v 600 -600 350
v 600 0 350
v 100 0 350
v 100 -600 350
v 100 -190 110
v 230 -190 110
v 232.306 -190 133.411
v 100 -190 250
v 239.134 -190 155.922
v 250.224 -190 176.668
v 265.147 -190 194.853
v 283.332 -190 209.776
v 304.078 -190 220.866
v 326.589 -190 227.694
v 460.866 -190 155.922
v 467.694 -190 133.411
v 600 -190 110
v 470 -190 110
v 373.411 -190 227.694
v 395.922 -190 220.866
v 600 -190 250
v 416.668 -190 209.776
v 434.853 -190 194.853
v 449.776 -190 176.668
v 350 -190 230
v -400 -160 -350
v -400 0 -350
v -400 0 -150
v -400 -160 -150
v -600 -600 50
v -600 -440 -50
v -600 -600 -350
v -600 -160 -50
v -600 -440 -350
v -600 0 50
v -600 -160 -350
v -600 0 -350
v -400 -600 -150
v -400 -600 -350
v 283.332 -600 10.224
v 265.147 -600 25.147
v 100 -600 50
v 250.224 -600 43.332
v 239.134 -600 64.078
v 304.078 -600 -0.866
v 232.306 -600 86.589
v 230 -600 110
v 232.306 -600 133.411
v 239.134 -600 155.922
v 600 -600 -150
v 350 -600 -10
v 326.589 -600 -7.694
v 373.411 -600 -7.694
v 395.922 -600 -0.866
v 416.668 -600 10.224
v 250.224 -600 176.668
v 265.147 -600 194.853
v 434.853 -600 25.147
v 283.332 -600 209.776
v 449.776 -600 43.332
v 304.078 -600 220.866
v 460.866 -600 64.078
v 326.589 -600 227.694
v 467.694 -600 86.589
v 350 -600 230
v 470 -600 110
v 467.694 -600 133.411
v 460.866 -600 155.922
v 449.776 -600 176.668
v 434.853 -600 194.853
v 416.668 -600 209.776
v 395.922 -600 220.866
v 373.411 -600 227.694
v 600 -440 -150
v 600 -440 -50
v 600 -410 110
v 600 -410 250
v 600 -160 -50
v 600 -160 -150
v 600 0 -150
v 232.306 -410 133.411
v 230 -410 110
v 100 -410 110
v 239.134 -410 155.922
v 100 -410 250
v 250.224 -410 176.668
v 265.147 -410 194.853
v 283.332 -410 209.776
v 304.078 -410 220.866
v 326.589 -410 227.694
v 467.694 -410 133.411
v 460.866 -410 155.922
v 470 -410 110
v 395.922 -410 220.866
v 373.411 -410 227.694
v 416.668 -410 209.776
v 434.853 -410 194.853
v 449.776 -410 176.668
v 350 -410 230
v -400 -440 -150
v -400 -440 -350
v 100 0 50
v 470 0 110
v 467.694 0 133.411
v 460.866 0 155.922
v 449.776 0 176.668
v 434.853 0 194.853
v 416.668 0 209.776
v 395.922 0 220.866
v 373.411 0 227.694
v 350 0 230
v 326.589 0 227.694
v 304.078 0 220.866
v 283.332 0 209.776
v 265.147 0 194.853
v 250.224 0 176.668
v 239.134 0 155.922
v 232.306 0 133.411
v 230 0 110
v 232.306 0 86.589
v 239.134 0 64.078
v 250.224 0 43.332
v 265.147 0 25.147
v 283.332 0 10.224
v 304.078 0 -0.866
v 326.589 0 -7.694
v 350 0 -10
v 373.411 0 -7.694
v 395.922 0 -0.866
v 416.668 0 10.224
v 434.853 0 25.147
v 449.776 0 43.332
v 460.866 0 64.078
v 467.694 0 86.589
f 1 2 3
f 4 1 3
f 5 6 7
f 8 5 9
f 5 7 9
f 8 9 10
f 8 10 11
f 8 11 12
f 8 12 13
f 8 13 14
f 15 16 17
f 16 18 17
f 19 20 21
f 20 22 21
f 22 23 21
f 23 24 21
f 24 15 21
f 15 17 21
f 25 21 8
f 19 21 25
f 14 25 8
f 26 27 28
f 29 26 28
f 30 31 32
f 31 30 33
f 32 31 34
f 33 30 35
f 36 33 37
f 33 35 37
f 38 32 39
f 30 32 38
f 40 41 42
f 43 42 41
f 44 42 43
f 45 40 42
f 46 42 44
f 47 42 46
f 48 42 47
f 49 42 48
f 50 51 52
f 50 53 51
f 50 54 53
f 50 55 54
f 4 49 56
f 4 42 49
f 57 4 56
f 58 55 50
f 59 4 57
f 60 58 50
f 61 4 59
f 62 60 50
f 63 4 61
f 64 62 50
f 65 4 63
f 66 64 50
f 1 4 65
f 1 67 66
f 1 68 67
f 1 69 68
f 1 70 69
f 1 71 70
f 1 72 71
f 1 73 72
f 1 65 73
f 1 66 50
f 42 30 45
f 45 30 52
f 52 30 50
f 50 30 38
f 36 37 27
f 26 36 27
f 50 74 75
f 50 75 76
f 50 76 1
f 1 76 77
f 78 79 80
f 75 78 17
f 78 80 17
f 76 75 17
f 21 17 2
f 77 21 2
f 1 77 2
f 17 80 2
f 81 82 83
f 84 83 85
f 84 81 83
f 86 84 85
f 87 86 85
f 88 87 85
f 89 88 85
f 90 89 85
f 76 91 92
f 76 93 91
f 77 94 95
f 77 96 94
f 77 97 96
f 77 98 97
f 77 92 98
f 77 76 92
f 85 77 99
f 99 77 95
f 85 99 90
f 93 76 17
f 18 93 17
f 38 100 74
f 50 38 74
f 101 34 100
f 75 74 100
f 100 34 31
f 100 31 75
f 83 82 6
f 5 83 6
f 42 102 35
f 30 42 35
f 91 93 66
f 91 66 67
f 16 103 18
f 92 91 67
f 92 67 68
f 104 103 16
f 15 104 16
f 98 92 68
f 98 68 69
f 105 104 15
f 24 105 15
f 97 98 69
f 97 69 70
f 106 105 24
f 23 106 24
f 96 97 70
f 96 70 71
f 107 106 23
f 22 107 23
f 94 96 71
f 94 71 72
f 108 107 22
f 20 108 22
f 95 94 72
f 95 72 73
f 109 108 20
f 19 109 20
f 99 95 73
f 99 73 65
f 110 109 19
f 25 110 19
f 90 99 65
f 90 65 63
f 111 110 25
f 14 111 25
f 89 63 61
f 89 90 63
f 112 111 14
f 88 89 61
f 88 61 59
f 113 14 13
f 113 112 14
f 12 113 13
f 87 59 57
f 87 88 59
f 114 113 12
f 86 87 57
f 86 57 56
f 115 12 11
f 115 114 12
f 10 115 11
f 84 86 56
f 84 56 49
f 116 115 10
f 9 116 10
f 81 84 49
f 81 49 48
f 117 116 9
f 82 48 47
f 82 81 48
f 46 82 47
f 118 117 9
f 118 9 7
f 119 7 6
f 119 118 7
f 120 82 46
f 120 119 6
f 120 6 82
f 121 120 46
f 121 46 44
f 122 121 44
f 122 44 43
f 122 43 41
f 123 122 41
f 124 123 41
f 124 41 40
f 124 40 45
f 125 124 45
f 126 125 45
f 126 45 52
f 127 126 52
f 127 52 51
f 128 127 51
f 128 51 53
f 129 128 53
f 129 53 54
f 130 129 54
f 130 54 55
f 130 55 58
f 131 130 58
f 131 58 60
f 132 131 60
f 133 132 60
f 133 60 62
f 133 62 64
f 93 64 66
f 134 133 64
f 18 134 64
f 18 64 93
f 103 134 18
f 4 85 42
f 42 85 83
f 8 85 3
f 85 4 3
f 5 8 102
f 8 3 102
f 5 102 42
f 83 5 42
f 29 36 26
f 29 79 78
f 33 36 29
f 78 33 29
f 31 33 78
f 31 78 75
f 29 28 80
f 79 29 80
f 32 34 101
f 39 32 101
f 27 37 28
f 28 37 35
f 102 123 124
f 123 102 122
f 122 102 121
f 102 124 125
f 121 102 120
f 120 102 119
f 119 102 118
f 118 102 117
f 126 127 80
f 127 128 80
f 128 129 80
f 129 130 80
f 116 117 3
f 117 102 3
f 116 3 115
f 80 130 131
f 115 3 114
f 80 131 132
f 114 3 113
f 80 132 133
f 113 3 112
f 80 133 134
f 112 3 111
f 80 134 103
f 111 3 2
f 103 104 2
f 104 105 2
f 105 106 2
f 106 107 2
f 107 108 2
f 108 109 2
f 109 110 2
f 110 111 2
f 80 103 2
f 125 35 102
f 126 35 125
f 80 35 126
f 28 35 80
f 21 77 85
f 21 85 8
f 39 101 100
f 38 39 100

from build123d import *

# Parameters (mm, degrees)
F0_R     = 120
F1_DEPTH = 600
F2_W     = 220
F2_H     = 140
F3_DEPTH = 1200.001
F4_W     = 280
F4_H     = 300
F5_DEPTH = 1200.001


with BuildPart() as f1:
    # F0 (on Front) → F1 (new body)
    with BuildSketch(Plane.XZ):
        with Locations((350, 110)):
            Circle(F0_R)
        Polygon((600, 110), (600, 350), (100, 350), (100, 50), (-600, 50), (-600, -350), (-400, -350), (-400, -150), (600, -150), (600, 50), align=None)
        with Locations((350, 110)):
            Circle(F0_R, mode=Mode.SUBTRACT)
    extrude(amount=F1_DEPTH)

    # F2 (on face) → F3 (cut, through all)
    with BuildSketch(Plane.YZ.offset(600)):
        with Locations((-300, 180)):
            Rectangle(F2_W, F2_H)
    extrude(amount=-F3_DEPTH, mode=Mode.SUBTRACT)

    # F4 (on face) → F5 (cut, through all)
    with BuildSketch(Plane(origin=(-600, 0, 0), x_dir=(0, -1, 0), z_dir=(-1, 0, 0))):
        with Locations((300, -200)):
            Rectangle(F4_W, F4_H)
    extrude(amount=-F5_DEPTH, mode=Mode.SUBTRACT)


solid = f1.part
